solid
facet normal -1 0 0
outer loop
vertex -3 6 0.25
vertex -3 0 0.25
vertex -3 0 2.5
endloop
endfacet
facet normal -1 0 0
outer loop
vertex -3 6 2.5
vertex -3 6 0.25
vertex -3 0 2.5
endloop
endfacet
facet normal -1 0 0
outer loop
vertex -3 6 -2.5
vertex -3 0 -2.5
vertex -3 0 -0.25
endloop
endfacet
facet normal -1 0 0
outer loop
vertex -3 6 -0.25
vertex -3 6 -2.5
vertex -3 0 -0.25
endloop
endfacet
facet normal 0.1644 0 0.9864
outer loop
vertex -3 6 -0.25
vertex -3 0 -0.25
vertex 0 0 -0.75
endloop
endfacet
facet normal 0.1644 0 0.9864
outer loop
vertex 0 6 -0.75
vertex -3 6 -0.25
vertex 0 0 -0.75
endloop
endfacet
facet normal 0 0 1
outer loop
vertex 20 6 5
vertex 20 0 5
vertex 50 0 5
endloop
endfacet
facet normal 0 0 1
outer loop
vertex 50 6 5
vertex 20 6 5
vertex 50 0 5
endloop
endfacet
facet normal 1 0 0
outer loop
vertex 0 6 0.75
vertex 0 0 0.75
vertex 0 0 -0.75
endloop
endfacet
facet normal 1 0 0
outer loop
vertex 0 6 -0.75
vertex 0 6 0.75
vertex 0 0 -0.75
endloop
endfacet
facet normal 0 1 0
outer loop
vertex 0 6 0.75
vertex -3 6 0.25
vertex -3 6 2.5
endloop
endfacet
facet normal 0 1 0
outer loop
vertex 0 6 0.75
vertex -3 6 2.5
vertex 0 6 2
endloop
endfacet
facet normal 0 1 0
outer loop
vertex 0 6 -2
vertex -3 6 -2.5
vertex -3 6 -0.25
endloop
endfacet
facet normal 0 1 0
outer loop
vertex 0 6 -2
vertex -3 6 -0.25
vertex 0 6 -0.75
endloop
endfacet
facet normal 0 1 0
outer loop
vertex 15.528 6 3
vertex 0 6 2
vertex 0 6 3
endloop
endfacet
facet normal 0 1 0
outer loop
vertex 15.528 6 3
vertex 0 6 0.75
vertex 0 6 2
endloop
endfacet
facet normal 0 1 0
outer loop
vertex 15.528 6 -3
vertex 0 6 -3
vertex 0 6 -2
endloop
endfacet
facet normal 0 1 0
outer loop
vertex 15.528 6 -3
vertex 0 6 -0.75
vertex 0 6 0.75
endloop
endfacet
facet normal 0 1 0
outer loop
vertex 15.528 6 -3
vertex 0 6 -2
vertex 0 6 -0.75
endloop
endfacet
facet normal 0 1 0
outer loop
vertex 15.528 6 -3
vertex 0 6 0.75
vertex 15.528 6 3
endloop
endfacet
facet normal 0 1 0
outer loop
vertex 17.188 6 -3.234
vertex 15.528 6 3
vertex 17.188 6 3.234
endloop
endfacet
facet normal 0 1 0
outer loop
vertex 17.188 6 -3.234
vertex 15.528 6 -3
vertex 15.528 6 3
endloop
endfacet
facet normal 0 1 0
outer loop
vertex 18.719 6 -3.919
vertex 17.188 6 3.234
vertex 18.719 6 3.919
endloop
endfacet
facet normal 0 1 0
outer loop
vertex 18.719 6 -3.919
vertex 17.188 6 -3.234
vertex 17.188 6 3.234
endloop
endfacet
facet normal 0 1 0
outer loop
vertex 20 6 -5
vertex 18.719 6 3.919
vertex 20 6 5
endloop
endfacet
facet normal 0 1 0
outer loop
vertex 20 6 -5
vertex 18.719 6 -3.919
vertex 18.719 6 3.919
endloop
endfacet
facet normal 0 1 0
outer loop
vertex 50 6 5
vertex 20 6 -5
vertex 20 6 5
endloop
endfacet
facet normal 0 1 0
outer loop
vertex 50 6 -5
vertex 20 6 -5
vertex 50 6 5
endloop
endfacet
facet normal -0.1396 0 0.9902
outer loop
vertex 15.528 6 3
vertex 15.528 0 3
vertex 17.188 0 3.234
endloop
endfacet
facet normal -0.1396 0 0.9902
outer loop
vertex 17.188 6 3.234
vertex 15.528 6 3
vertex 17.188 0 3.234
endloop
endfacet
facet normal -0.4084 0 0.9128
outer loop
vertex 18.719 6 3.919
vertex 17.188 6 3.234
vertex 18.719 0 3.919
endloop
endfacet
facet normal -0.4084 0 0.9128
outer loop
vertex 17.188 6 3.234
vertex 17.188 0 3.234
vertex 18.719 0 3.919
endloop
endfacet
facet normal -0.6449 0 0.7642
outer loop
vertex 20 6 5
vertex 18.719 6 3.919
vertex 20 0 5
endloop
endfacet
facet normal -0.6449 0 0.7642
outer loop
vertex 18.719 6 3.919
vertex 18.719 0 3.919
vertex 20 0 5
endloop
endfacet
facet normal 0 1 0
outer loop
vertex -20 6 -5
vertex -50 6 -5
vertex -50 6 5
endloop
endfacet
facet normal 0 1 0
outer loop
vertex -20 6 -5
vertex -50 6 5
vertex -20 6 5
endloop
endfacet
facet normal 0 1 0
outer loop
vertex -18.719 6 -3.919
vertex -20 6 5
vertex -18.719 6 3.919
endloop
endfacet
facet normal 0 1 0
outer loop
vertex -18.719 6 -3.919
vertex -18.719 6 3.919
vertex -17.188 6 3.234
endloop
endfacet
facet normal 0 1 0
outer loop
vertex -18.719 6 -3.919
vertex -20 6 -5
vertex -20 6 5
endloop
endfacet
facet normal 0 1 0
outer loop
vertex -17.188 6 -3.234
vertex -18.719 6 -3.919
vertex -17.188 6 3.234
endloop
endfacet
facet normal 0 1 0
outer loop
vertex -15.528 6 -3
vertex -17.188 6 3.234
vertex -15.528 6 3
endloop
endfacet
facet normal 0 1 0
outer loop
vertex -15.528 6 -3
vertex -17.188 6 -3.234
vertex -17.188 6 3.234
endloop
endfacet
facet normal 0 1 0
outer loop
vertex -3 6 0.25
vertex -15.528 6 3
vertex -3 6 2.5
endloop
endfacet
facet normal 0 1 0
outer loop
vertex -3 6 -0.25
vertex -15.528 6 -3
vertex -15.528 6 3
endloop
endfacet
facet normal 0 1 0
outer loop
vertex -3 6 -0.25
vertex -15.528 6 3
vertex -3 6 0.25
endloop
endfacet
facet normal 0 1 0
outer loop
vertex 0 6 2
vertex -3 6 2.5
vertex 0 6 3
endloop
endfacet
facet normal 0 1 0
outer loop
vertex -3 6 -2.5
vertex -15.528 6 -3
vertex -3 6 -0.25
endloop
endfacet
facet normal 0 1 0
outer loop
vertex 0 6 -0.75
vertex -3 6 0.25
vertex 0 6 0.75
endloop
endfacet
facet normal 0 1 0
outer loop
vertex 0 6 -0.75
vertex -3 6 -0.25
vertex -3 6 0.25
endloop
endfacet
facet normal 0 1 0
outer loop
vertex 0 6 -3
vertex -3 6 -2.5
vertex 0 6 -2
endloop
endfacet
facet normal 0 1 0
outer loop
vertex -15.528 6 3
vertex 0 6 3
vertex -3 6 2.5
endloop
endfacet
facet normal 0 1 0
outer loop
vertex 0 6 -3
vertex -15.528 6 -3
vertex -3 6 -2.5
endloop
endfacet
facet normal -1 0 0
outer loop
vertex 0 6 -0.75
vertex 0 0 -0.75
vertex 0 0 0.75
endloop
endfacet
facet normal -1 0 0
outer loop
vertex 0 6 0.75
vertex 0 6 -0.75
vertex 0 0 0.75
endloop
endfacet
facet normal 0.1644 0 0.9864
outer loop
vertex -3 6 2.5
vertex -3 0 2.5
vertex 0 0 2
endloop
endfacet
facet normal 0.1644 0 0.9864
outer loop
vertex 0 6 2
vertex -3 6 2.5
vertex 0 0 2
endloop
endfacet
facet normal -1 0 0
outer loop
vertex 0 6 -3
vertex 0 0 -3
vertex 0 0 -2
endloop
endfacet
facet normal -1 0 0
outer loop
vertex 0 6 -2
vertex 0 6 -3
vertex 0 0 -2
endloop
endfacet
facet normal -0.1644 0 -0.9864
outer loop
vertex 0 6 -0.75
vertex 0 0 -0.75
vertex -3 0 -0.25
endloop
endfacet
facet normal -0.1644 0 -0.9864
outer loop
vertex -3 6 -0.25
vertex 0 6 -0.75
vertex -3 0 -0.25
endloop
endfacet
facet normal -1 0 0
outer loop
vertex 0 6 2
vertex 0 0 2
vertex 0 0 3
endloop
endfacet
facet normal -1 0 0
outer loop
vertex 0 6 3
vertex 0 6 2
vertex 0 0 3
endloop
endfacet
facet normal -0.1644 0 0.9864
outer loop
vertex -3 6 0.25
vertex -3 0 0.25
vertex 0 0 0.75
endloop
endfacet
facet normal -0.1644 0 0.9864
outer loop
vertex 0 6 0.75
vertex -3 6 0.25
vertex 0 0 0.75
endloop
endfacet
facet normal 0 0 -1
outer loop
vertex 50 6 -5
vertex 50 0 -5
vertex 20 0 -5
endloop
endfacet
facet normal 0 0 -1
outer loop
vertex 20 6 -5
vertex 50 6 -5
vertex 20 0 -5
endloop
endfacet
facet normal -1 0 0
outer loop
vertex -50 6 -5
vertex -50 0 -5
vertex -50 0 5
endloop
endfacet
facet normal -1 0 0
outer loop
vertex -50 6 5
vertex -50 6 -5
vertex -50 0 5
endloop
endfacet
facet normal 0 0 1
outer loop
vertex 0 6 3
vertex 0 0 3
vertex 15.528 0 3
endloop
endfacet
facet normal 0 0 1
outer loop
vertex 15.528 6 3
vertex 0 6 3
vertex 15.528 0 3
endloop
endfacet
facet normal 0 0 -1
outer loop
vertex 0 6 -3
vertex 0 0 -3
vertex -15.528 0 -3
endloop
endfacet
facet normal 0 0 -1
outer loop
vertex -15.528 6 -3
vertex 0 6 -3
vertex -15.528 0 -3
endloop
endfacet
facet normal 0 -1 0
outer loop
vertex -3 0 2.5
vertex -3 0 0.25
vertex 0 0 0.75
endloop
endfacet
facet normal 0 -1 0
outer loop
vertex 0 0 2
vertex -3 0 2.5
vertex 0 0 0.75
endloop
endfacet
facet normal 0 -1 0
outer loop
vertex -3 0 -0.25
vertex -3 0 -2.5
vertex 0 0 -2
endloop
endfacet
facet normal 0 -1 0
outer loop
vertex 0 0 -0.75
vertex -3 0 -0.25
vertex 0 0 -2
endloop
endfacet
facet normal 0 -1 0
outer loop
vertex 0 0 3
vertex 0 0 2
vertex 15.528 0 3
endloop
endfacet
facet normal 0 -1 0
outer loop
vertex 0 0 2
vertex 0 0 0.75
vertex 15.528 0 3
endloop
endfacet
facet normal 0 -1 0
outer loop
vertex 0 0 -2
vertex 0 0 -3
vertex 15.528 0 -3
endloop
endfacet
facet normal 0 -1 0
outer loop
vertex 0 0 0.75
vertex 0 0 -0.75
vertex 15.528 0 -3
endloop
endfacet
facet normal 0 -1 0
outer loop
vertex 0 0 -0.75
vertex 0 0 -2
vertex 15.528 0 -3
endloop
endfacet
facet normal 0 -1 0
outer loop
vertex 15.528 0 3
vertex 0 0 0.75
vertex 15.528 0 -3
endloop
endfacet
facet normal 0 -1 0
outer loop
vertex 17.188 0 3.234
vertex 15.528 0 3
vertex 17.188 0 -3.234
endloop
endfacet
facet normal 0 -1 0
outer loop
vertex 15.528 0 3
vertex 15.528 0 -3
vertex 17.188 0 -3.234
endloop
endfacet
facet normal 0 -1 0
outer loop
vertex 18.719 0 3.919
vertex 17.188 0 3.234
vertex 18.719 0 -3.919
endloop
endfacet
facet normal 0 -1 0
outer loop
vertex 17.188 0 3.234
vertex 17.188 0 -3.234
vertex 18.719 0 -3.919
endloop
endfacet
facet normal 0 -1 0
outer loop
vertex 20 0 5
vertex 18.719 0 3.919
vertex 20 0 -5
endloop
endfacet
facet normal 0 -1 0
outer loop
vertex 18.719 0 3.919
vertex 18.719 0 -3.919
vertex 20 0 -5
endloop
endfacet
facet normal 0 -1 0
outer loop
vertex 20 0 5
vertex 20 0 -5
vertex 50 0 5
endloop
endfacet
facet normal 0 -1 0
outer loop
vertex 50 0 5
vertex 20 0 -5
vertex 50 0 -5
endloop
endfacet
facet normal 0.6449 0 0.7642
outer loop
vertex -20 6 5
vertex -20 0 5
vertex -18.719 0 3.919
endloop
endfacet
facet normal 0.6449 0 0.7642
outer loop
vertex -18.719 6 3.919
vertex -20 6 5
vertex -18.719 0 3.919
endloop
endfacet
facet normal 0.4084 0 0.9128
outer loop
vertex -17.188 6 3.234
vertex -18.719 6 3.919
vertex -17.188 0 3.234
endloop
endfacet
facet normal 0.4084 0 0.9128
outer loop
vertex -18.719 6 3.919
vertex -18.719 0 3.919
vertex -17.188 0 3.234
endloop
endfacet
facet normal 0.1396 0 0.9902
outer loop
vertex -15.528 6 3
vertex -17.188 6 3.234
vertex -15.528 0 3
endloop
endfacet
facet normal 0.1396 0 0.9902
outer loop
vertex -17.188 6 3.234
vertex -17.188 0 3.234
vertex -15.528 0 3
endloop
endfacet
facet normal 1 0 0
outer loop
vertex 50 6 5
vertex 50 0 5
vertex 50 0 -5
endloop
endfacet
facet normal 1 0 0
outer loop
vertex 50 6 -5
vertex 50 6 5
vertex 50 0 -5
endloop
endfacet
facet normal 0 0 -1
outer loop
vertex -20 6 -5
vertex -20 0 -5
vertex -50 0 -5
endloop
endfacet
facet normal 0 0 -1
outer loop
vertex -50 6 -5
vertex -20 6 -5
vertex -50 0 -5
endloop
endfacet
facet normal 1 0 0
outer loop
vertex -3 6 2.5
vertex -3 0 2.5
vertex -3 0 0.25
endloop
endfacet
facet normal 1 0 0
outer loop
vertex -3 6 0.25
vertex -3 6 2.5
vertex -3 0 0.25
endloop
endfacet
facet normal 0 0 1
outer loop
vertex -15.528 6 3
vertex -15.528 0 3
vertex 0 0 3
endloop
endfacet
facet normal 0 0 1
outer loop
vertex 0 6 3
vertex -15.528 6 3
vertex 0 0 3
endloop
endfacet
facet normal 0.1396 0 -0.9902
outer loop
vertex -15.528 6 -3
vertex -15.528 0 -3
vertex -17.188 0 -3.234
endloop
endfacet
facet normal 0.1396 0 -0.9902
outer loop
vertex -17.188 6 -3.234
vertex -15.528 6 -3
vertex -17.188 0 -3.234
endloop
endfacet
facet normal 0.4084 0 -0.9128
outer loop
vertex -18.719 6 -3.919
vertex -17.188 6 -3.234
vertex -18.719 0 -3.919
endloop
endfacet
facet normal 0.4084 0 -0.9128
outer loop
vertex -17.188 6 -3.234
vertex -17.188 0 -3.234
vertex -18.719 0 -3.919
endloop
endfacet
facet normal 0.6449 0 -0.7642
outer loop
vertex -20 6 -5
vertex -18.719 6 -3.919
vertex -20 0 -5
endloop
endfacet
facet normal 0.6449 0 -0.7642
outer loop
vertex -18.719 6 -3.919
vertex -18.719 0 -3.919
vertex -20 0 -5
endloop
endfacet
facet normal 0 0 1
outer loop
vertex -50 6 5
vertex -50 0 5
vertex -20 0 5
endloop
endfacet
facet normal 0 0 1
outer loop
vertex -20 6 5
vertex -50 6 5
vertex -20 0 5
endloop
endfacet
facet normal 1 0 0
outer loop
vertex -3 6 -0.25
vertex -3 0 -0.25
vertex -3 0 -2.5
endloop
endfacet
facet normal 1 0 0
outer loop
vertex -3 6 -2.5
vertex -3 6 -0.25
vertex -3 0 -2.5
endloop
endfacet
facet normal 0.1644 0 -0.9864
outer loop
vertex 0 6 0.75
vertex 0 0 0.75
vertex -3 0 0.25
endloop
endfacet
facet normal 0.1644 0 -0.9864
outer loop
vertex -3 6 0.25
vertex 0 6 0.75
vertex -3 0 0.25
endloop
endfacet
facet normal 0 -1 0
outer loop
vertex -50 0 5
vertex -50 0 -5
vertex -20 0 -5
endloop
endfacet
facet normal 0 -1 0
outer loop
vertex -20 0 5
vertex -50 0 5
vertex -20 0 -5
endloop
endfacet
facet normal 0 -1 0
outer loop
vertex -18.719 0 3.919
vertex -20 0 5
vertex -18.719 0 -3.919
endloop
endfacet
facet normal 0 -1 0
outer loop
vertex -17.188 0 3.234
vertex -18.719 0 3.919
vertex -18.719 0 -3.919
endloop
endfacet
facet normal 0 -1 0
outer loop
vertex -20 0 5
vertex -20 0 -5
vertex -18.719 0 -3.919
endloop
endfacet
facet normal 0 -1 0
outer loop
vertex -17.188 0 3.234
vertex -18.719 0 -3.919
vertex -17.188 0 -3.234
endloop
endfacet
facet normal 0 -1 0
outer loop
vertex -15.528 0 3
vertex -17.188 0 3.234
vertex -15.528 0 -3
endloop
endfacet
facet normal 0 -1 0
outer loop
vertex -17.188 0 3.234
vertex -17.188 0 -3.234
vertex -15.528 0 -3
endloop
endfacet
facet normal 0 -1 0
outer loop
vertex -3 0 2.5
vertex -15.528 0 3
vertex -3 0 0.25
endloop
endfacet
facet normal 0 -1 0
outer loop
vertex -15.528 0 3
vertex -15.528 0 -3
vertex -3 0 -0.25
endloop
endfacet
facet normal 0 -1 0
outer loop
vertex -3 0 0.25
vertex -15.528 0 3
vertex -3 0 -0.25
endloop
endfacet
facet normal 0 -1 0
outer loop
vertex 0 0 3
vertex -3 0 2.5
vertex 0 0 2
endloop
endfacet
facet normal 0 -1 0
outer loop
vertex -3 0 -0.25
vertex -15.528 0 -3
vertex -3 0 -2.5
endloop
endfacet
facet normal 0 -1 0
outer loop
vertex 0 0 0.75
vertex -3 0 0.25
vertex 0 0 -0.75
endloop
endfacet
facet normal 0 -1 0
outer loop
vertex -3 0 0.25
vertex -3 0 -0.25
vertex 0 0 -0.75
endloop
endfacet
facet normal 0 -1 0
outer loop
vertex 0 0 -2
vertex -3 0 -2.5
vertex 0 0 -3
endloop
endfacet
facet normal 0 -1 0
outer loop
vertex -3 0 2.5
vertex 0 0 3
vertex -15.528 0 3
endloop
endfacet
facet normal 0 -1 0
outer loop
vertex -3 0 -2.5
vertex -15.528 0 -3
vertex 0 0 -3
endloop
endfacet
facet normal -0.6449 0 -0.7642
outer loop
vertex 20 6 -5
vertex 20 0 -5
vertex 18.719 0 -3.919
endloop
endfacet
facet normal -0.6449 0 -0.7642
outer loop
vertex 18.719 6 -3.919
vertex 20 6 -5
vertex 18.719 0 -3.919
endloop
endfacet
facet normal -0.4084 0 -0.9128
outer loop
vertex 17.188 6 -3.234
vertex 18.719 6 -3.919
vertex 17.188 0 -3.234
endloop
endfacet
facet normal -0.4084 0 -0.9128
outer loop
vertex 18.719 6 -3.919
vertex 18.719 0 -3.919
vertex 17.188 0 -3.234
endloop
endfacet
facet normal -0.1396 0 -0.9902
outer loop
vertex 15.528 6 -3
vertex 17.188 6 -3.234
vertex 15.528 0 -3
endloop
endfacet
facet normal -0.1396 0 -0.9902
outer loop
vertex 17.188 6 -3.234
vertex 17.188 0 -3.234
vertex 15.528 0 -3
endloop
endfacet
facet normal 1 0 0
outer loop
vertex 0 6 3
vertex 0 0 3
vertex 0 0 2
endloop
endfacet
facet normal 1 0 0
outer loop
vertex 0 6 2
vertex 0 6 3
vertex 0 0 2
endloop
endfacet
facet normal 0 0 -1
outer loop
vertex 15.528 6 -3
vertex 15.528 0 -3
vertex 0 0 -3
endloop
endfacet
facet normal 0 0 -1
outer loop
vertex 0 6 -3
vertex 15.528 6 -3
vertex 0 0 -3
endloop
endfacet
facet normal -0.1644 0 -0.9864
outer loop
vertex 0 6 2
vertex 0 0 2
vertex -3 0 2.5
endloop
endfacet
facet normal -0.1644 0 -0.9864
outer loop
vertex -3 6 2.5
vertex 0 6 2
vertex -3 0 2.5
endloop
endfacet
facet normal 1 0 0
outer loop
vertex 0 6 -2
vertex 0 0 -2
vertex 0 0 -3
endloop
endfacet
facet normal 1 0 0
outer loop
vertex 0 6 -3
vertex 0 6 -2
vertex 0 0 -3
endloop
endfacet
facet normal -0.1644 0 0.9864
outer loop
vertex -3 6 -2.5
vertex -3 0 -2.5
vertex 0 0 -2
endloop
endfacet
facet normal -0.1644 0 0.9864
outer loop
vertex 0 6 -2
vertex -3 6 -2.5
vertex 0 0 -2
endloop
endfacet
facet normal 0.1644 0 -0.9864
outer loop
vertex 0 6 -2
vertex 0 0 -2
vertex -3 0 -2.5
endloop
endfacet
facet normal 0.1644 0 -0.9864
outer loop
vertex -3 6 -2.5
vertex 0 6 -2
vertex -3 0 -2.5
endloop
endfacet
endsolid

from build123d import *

# Parameters (mm, degrees)
BOSS_EXTRUDE1_DEPTH = 6
BOSS_EXTRUDE3_DEPTH = 6


with BuildPart() as part:
    # Sketch1 → Boss-Extrude1 (new body)
    with BuildSketch(Plane(origin=(0, 0, 0), x_dir=(1, 0, 0), z_dir=(0, 1, 0))):
        with BuildLine():
            Line((-15.527864045, -3), (0, -3))
            Line((0, -3), (0, -2))
            Line((0, -2), (-3, -2.5))
            Line((-3, -2.5), (-3, -0.25))
            Line((-3, -0.25), (0, -0.75))
            Line((0, -0.75), (0, 0.75))
            Line((0, 0.75), (-3, 0.25))
            Line((-3, 0.25), (-3, 2.5))
            Line((-3, 2.5), (0, 2))
            Line((0, 2), (0, 3))
            Line((0, 3), (-15.527864045, 3))
            ThreePointArc((-15.527864045, 3), (-17.977353788, 3.522774425), (-20, 5))
            Line((-20, 5), (-50, 5))
            Line((-50, 5), (-50, -5))
            Line((-50, -5), (-20, -5))
            ThreePointArc((-20, -5), (-17.977353788, -3.522774425), (-15.527864045, -3))
        make_face()
    extrude(amount=BOSS_EXTRUDE1_DEPTH)


with BuildPart() as body_2:
    # Sketch1<4> → Boss-Extrude3 (new body)
    with BuildSketch(Plane(origin=(0, 0, 0), x_dir=(1, 0, 0), z_dir=(0, 1, 0))):
        with BuildLine():
            Line((0, -3), (15.527864045, -3))
            ThreePointArc((15.527864045, -3), (17.977353788, -3.522774425), (20, -5))
            Line((20, -5), (50, -5))
            Line((50, -5), (50, 5))
            Line((50, 5), (20, 5))
            ThreePointArc((20, 5), (17.977353788, 3.522774425), (15.527864045, 3))
            Line((15.527864045, 3), (0, 3))
            Line((0, 3), (0, 2))
            Line((0, 2), (-3, 2.5))
            Line((-3, 2.5), (-3, 0.25))
            Line((-3, 0.25), (0, 0.75))
            Line((0, 0.75), (0, -0.75))
            Line((0, -0.75), (-3, -0.25))
            Line((-3, -0.25), (-3, -2.5))
            Line((-3, -2.5), (0, -2))
            Line((0, -2), (0, -3))
        make_face()
    extrude(amount=BOSS_EXTRUDE3_DEPTH)


solid = Compound([part.part, body_2.part])
